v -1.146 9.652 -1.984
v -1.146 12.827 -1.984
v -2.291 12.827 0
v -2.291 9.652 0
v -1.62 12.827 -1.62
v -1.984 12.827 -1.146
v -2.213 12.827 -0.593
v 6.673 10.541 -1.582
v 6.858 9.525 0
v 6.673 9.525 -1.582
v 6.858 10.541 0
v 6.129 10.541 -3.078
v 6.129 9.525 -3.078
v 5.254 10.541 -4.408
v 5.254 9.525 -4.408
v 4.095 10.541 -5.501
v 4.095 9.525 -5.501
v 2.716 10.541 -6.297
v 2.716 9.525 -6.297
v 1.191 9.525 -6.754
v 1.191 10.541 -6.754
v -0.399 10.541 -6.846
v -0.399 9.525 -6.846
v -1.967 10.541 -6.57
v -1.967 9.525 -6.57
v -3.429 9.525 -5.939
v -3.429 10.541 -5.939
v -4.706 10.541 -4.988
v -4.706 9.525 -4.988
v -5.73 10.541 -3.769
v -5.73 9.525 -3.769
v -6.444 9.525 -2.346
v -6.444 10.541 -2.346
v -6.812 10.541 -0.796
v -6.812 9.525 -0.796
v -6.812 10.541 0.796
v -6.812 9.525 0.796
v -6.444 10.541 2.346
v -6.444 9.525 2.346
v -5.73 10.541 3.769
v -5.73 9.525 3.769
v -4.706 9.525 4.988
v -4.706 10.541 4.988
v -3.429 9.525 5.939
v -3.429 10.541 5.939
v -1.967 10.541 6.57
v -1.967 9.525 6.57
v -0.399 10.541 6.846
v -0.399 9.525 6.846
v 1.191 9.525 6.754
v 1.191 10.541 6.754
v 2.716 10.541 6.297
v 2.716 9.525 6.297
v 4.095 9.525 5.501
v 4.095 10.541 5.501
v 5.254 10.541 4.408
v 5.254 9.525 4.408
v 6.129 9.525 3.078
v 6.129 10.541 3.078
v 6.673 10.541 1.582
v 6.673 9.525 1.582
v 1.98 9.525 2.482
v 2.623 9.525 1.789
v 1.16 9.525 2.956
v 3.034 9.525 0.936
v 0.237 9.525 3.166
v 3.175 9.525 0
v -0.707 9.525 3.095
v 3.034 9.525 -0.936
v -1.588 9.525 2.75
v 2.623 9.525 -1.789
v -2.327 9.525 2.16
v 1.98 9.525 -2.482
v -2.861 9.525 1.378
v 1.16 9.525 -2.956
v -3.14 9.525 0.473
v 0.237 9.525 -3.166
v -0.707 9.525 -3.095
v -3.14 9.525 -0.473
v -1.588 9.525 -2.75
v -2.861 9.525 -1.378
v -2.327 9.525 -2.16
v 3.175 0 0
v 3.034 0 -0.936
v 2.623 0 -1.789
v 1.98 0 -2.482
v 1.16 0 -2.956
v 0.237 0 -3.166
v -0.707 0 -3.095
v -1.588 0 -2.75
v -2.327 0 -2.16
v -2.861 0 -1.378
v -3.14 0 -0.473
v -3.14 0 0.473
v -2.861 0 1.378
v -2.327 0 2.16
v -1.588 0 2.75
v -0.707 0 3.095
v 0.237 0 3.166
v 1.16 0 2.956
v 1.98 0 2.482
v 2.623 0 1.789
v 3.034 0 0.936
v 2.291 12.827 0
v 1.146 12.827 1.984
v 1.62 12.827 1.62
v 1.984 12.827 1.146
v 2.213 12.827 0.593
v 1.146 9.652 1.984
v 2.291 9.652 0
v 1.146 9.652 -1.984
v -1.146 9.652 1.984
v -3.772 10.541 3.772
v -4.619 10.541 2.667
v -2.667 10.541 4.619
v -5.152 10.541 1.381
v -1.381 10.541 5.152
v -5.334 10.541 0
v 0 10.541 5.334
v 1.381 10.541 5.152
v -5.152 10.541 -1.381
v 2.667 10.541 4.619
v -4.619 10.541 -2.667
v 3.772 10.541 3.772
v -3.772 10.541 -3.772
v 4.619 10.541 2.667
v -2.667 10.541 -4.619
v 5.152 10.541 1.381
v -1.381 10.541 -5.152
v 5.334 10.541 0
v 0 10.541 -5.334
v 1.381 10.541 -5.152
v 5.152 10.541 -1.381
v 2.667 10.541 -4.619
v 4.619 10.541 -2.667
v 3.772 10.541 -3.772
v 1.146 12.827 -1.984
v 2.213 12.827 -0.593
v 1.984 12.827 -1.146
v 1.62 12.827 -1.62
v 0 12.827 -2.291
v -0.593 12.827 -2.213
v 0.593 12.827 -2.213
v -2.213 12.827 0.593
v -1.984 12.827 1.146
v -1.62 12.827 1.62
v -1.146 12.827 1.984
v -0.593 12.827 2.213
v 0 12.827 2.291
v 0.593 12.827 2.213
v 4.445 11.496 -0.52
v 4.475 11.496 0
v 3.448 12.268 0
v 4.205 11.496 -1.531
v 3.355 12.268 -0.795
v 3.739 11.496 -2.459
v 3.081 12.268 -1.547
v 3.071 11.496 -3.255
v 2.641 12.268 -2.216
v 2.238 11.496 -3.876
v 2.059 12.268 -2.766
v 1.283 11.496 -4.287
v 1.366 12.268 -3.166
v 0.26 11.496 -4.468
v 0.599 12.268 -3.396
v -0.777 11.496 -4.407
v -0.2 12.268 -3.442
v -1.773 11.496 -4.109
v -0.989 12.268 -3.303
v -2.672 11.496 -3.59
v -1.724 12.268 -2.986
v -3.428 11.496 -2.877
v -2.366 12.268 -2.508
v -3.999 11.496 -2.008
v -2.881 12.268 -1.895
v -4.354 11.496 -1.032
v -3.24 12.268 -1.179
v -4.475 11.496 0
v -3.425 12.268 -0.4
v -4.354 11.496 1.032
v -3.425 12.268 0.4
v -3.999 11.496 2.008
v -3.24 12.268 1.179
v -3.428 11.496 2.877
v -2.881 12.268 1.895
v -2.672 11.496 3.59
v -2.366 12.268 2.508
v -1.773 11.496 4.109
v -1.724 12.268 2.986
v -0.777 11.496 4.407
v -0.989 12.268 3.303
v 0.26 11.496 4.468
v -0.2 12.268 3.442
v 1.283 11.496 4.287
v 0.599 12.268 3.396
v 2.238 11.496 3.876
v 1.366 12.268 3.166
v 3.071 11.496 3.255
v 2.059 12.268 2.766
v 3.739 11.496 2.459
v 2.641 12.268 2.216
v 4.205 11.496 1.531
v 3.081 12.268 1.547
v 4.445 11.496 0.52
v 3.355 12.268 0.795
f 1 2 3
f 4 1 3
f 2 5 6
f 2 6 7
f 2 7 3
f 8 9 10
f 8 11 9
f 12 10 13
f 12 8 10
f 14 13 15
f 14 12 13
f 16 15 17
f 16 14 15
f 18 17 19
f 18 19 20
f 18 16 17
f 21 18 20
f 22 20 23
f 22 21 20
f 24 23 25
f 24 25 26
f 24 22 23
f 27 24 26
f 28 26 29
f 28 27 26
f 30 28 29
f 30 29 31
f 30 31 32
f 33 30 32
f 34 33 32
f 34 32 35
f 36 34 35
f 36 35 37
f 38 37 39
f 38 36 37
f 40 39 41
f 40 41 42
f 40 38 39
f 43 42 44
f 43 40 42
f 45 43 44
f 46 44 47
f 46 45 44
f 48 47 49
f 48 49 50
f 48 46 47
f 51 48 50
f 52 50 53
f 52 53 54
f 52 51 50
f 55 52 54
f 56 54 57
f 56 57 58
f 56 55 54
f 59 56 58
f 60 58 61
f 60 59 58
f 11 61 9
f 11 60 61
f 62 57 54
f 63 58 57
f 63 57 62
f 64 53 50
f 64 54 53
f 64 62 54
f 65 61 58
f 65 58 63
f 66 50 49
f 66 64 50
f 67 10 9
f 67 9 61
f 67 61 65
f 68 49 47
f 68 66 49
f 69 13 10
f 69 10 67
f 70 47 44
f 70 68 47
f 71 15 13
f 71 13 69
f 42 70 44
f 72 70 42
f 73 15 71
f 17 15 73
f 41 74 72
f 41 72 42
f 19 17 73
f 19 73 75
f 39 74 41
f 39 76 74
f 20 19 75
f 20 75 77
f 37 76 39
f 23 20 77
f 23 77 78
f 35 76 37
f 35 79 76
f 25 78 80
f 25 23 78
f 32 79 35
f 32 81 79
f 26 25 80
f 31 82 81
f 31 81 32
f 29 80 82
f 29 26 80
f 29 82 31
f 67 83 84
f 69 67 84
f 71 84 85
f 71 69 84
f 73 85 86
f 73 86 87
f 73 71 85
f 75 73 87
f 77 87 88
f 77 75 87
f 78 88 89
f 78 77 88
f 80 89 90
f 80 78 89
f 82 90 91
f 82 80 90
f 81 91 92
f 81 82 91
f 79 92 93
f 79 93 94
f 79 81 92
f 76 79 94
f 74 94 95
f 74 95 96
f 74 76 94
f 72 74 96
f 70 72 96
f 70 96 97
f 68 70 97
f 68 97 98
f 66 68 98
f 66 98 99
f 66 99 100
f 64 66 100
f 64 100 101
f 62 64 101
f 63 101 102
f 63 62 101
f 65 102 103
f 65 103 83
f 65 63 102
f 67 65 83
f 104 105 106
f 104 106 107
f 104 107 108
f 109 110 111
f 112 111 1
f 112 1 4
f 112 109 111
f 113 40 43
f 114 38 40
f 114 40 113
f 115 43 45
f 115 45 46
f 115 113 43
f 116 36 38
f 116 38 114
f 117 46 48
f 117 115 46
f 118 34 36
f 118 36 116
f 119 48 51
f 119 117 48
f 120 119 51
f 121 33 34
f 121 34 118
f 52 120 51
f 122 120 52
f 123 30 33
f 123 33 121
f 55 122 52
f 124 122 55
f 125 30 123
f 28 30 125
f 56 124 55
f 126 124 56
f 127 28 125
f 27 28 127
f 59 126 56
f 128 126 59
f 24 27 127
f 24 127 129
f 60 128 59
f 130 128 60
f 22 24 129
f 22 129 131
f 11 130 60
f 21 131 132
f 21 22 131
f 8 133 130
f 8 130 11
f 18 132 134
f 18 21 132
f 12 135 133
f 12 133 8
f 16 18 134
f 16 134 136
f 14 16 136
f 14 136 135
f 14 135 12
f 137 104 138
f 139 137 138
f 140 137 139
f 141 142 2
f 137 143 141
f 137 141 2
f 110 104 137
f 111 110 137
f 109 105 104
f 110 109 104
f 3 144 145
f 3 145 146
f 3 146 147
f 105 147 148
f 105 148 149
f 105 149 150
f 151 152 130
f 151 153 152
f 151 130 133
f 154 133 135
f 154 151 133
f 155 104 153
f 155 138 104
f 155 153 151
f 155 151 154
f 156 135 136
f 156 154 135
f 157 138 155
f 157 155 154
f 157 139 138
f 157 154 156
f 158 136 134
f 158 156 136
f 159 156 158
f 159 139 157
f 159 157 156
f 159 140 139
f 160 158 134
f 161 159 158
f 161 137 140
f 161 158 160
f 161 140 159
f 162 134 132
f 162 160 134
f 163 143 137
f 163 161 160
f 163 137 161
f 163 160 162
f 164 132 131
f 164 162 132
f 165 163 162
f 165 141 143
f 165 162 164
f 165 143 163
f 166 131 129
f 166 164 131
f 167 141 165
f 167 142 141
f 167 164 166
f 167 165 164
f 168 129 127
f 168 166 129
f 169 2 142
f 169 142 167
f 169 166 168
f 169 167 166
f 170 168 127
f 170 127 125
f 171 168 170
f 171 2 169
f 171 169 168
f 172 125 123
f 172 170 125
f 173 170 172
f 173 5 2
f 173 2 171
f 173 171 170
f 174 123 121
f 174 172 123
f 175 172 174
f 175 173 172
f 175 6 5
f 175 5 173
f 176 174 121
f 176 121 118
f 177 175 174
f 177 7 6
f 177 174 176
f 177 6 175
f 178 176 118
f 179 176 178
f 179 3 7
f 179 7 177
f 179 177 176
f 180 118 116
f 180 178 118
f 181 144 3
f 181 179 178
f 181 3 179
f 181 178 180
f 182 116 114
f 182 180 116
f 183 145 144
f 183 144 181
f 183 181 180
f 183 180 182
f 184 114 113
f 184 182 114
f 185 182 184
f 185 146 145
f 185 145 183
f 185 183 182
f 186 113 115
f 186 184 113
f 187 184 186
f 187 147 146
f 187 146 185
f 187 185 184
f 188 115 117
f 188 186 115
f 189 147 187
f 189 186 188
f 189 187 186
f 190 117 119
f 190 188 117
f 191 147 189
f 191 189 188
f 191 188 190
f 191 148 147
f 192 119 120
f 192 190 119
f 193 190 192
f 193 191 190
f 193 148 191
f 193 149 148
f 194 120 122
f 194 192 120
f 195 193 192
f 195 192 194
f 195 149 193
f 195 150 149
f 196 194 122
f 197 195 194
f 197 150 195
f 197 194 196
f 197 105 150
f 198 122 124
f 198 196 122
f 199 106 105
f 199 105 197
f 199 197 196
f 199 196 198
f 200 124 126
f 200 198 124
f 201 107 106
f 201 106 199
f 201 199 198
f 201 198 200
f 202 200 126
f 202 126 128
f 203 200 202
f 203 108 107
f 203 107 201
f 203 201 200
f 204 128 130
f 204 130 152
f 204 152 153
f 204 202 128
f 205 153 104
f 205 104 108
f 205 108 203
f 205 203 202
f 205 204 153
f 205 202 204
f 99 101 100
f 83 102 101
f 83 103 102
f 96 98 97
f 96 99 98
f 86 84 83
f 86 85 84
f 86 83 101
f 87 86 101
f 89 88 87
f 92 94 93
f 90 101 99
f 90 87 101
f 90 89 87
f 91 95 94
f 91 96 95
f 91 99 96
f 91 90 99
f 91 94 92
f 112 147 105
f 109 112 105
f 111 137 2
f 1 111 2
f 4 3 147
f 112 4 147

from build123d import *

# Parameters (mm, degrees)
HEX_CUT_DEPTH = 3.175


with BuildPart() as part:
    # Sketch1 → Screw revolve (revolve)
    with BuildSketch(Plane.XY):
        with BuildLine():
            Line((0, 0), (3.175, 0))
            Line((3.175, 0), (3.175, 9.525))
            Line((3.175, 9.525), (6.858, 9.525))
            Line((6.858, 9.525), (6.858, 10.541))
            Line((6.858, 10.541), (5.334, 10.541))
            ThreePointArc((5.334, 10.541), (3.980323293, 11.907132143), (2.291358881, 12.827))
            Line((2.291358881, 12.827), (0, 12.827))
            Line((0, 12.827), (0, 0))
        make_face()
    revolve(axis=Axis((0, 0, 0), (0, 1, 0)))

    # Sketch2 → Hex Cut (cut)
    with BuildSketch(Plane(origin=(0, 12.827, 0), x_dir=(-1, 0, 0), z_dir=(0, 1, 0))):
        Polygon((-2.291358881, 0), (-1.14567944, -1.984375), (1.14567944, -1.984375), (2.291358881, 0), (1.14567944, 1.984375), (-1.14567944, 1.984375), align=None)
    extrude(amount=-HEX_CUT_DEPTH, mode=Mode.SUBTRACT)


solid = part.part
